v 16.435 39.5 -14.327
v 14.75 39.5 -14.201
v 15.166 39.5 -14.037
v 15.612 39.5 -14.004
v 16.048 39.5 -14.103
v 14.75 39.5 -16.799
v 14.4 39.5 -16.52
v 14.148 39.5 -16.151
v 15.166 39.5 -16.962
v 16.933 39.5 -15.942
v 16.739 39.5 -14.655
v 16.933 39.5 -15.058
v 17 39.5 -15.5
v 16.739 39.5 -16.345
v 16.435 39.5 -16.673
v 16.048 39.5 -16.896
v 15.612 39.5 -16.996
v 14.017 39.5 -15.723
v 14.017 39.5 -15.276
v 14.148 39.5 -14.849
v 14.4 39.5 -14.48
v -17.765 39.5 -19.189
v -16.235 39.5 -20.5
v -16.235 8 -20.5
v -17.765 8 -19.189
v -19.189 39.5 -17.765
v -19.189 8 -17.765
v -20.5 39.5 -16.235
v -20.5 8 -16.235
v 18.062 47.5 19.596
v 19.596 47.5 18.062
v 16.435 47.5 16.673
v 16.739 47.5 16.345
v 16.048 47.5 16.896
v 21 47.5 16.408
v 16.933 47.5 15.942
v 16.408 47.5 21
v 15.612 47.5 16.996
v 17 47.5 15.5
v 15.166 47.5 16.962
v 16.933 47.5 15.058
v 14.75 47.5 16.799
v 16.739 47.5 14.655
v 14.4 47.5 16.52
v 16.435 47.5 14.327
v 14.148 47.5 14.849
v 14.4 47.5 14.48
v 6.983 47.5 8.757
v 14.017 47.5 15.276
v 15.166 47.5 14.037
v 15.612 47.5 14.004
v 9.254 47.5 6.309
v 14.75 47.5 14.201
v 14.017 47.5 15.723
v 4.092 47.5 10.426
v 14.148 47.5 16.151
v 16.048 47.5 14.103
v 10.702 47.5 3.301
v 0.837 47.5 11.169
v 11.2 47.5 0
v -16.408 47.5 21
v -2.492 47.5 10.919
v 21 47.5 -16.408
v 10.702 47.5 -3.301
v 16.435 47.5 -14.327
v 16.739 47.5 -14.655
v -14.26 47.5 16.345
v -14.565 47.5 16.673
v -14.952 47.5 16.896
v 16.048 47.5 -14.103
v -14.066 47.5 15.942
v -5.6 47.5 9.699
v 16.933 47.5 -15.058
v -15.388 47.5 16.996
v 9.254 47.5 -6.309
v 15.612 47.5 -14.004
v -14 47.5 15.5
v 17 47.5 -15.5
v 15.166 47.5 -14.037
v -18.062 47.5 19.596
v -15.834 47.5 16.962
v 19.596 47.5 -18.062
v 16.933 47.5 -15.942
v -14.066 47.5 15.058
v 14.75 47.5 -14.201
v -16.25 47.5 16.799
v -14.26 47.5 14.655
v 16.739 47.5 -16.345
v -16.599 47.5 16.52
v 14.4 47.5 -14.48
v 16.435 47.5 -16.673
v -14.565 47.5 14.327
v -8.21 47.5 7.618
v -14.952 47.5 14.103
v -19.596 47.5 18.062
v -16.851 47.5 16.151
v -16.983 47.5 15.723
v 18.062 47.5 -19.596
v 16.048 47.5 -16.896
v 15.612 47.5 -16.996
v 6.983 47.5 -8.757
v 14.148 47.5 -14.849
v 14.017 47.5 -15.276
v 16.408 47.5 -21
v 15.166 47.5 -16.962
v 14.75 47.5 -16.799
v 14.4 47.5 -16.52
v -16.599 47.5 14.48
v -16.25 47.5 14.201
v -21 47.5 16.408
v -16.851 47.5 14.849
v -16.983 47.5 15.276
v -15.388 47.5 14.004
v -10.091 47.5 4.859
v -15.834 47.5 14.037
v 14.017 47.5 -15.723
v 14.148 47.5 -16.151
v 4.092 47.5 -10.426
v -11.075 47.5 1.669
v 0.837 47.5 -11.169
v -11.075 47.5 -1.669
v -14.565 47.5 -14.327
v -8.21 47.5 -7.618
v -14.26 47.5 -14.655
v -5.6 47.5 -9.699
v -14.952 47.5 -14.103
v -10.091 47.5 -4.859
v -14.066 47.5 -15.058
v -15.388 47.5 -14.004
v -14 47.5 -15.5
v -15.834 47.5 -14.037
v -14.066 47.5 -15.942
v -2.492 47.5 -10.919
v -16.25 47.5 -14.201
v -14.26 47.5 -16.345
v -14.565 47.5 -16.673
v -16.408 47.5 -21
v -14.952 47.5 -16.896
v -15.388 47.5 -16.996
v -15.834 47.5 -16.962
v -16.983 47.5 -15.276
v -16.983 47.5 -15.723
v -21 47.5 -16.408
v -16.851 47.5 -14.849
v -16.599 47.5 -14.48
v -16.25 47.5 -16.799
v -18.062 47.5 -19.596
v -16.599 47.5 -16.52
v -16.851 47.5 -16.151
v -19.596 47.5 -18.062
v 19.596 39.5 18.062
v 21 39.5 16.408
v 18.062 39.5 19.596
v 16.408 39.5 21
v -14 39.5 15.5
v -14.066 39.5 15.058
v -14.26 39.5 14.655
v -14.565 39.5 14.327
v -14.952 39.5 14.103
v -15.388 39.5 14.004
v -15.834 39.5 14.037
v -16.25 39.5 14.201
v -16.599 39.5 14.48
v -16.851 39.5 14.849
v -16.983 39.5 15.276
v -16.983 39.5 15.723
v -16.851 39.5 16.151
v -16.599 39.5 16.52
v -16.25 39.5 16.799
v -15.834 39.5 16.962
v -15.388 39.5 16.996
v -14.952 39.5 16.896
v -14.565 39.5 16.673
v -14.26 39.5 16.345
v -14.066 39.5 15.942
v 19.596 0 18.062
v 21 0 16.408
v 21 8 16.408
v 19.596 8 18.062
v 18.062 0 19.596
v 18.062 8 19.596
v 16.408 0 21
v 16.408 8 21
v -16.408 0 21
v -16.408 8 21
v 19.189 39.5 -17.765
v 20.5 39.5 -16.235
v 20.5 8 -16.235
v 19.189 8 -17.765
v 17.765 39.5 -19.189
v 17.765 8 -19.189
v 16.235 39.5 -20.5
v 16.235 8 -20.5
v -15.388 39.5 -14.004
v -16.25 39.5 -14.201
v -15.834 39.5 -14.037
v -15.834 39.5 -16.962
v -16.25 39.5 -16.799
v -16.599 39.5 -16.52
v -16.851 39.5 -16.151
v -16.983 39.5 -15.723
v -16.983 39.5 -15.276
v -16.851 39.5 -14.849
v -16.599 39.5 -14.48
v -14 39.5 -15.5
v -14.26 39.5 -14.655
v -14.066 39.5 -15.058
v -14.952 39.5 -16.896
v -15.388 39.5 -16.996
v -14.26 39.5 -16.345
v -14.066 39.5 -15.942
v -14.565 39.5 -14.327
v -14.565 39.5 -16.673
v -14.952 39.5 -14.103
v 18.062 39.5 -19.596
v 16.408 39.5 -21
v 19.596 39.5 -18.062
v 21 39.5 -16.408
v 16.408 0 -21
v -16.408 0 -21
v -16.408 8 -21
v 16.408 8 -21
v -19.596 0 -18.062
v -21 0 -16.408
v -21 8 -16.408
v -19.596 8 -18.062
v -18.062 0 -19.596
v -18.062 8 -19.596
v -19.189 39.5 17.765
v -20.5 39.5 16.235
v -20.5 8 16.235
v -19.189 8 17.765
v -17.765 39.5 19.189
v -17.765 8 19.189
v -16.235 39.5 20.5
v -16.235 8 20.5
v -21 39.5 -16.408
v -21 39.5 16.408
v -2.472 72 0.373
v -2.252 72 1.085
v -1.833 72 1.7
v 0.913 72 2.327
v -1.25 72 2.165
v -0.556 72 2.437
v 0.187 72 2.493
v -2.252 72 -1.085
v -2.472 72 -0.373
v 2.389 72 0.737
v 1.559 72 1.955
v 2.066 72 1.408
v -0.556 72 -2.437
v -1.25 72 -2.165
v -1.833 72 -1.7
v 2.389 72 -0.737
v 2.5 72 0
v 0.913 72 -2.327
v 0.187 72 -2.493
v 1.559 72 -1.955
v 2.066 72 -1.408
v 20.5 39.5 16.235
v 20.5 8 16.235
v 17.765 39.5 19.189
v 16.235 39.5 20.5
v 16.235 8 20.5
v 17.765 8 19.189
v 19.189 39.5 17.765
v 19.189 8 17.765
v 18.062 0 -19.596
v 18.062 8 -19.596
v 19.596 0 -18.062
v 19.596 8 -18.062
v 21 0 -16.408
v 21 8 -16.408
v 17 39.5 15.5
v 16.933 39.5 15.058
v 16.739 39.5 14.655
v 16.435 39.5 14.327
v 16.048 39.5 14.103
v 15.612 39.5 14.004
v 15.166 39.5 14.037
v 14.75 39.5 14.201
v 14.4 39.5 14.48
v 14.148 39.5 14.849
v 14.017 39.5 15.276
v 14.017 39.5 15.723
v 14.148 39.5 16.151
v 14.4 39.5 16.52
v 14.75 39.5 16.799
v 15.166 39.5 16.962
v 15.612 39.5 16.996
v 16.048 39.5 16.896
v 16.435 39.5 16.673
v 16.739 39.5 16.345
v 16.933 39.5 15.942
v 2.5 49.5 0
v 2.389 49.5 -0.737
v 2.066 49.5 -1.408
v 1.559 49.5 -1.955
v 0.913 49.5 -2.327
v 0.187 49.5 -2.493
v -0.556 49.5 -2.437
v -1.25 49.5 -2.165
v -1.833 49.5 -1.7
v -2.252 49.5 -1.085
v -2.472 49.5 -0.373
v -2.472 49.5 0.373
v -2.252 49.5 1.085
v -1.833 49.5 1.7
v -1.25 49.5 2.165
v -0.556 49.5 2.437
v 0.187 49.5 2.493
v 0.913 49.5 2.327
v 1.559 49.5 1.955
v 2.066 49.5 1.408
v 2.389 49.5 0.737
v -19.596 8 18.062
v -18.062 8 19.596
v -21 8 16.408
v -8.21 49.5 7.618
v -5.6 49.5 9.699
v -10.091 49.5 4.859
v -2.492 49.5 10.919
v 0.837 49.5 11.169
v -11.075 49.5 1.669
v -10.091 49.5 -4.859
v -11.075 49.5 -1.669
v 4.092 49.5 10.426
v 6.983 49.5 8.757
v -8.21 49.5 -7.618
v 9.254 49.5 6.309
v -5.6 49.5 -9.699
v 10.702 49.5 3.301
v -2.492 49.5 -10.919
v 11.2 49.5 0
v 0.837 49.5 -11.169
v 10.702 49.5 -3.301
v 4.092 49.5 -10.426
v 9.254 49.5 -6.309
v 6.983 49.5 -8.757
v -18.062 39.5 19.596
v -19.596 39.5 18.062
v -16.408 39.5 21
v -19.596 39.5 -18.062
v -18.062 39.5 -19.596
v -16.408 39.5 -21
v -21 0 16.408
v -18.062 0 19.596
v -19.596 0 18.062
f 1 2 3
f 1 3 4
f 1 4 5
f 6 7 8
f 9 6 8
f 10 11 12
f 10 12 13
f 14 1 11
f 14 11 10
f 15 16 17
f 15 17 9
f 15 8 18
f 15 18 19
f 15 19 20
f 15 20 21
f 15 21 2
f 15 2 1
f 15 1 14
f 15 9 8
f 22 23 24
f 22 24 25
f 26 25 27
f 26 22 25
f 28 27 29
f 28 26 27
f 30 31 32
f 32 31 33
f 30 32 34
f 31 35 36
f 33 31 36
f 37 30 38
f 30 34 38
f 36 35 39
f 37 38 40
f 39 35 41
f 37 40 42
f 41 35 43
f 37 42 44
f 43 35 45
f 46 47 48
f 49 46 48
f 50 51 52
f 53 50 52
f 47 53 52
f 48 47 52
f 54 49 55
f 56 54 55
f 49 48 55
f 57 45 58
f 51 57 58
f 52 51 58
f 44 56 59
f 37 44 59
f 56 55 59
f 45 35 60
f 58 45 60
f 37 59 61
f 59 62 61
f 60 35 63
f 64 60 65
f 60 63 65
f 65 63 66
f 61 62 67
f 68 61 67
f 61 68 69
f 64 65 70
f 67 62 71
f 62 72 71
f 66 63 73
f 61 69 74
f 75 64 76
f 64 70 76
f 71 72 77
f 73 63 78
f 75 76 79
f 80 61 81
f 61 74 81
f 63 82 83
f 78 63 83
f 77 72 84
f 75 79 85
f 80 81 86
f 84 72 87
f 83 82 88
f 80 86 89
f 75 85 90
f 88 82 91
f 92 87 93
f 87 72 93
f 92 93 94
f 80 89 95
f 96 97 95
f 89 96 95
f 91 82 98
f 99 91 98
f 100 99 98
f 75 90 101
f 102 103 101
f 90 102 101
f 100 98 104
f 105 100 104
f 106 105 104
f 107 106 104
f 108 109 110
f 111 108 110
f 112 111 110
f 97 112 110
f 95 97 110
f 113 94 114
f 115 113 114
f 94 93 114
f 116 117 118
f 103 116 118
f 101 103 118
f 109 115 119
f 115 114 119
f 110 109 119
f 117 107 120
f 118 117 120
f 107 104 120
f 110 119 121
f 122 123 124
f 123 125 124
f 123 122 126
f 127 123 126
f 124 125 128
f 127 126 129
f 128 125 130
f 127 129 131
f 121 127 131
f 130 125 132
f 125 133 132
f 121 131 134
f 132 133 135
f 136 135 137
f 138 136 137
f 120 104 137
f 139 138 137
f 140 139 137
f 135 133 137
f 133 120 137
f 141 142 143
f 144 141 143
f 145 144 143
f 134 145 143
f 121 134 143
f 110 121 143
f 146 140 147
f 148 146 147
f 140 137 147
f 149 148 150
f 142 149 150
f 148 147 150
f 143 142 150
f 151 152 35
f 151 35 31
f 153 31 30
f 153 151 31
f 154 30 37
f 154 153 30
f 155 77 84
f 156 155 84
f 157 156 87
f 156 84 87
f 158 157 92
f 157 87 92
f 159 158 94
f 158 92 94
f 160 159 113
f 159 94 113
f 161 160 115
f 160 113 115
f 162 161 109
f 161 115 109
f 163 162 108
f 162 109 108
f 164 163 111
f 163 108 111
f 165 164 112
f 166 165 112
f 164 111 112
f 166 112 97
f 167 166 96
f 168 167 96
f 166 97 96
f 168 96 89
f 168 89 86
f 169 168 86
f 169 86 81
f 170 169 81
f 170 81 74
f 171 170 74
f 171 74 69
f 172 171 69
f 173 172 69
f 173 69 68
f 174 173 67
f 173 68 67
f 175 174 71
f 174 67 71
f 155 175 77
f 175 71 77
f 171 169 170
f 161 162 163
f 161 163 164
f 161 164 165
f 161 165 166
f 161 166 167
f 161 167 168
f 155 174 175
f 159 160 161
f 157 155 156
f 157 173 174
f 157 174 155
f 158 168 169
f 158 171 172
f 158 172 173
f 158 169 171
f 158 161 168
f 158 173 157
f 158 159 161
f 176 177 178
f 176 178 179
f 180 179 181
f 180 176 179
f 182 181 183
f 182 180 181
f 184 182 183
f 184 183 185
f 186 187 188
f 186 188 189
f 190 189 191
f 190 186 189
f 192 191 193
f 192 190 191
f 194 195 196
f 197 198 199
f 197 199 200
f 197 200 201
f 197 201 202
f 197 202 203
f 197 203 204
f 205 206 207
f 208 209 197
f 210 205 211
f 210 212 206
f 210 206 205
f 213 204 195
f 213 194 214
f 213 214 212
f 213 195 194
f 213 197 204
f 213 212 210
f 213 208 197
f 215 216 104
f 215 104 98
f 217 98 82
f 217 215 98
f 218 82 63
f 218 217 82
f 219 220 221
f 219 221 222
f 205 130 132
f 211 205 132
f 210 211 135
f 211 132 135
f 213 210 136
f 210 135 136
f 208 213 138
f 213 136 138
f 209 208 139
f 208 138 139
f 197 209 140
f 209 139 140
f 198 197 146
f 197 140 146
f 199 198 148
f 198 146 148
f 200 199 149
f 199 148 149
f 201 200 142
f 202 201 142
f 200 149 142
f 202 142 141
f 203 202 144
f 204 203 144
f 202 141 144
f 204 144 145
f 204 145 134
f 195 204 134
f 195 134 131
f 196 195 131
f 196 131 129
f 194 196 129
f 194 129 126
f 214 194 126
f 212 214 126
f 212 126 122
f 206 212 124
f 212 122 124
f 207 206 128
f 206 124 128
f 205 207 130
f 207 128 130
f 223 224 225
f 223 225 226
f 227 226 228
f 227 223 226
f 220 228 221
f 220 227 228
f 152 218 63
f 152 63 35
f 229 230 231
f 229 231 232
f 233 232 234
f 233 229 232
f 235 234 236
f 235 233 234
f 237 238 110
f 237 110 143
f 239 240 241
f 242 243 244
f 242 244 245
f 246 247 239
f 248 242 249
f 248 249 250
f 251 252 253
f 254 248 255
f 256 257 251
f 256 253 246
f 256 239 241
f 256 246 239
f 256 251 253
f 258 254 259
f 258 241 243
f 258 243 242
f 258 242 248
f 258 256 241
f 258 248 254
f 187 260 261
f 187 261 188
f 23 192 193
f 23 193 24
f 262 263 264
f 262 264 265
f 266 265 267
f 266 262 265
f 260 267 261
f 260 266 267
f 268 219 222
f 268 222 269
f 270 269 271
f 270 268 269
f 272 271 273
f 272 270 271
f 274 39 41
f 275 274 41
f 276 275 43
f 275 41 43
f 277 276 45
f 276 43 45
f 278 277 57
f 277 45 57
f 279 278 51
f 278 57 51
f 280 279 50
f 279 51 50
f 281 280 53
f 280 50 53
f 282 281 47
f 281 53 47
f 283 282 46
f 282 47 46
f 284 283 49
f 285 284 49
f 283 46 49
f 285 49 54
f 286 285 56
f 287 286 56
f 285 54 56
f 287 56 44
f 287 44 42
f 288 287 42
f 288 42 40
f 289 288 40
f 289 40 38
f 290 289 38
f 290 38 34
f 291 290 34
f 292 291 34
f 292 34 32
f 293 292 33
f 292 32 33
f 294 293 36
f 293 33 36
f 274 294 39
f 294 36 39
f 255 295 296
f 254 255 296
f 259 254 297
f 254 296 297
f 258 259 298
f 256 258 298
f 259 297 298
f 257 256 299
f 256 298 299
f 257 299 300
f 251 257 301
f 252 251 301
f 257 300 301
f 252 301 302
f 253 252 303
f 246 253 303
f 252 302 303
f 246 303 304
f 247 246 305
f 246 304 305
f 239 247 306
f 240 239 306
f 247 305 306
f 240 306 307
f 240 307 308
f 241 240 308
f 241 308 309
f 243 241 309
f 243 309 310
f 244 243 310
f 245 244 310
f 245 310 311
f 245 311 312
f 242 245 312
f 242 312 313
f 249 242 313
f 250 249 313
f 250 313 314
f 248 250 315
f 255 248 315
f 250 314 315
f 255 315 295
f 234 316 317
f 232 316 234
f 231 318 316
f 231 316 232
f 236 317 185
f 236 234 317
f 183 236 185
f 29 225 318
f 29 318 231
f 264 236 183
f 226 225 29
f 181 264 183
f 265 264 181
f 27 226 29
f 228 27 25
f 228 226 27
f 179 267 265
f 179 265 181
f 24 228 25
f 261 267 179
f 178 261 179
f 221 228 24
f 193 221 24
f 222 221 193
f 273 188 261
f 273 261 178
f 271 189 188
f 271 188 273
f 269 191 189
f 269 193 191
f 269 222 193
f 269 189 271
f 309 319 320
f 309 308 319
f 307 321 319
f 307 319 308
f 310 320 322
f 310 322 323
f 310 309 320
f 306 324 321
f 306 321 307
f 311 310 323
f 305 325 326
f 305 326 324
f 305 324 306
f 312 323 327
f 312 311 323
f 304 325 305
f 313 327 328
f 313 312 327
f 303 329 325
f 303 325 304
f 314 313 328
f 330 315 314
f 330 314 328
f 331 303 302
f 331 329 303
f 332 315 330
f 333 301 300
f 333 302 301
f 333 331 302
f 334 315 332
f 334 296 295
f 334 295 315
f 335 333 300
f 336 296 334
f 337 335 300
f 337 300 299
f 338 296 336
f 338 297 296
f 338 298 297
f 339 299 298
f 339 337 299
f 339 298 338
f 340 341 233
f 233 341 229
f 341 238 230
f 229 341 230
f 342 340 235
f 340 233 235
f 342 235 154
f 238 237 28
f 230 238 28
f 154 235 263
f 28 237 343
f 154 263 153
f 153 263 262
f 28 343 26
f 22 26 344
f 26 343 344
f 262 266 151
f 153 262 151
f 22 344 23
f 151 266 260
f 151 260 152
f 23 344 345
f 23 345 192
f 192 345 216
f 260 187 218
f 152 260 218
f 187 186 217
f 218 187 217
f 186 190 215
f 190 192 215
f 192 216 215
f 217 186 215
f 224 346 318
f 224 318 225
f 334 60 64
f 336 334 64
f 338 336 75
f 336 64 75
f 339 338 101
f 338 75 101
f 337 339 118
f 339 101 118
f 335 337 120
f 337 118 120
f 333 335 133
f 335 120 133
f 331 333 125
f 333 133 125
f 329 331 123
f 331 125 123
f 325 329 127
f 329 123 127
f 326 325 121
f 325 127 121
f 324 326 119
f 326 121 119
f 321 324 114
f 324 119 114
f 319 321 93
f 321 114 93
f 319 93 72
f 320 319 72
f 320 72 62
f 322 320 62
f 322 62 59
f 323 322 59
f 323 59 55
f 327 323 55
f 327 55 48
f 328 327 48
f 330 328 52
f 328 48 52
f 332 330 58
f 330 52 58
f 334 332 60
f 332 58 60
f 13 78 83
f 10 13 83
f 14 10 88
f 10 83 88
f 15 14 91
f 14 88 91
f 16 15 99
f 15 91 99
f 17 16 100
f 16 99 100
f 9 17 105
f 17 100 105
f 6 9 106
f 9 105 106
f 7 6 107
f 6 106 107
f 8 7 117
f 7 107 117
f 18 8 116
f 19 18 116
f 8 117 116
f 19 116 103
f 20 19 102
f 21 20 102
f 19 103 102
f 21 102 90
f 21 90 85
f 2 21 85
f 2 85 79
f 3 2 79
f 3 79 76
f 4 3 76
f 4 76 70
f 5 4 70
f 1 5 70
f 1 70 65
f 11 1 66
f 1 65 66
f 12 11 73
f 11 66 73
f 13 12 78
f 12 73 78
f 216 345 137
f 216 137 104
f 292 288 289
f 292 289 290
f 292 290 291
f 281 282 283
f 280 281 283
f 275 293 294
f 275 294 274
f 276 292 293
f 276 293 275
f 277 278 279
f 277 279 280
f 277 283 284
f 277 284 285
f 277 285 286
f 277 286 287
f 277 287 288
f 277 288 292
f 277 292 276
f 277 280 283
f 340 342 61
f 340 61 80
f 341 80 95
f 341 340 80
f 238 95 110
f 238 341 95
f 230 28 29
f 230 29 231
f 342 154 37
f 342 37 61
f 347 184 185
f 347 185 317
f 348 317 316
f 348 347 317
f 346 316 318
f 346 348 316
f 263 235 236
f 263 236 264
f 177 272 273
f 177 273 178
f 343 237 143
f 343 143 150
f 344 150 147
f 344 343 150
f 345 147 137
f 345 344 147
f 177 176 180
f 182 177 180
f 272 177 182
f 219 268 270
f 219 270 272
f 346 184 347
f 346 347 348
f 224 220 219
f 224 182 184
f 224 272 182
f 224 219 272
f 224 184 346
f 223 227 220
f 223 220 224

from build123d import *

# Parameters (mm, degrees)
BOSS_EXTRUDE1_DEPTH = 47.5
SKETCH2_R           = 1.5
CUT_EXTRUDE1_DEPTH  = 8
SKETCH3_R           = 11.2
BOSS_EXTRUDE2_DEPTH = 2
SKETCH4_R           = 2.5
BOSS_EXTRUDE3_DEPTH = 22.5
CUT_EXTRUDE2_START  = -8
SKETCH5_OUTSIDE_W   = 62.668
SKETCH5_OUTSIDE_H   = 62.668
CUT_EXTRUDE2_DEPTH  = 31.5


with BuildPart() as part:
    # Sketch1 → Boss-Extrude1 (new body)
    with BuildSketch(Plane(origin=(0, 0, 0), x_dir=(1, 0, 0), z_dir=(0, 1, 0))):
        with BuildLine():
            Line((-16.408001097, 21), (16.408001097, 21))
            ThreePointArc((16.408001097, 21), (18.844395719, 18.844395719), (21, 16.408001097))
            Line((21, 16.408001097), (21, -16.408001097))
            ThreePointArc((21, -16.408001097), (18.844395719, -18.844395719), (16.408001097, -21))
            Line((16.408001097, -21), (-16.408001097, -21))
            ThreePointArc((-16.408001097, -21), (-18.844395719, -18.844395719), (-21, -16.408001097))
            Line((-21, -16.408001097), (-21, 16.408001097))
            ThreePointArc((-21, 16.408001097), (-18.844395719, 18.844395719), (-16.408001097, 21))
        make_face()
    extrude(amount=BOSS_EXTRUDE1_DEPTH)

    # Sketch2 → Cut-Extrude1 (cut)
    with BuildSketch(Plane(origin=(0, 47.5, 0), x_dir=(1, 0, 0), z_dir=(0, 1, 0))):
        with Locations((-15.499780644, 15.499780644)):
            Circle(SKETCH2_R)
        with Locations((-15.499780644, -15.499780644)):
            Circle(SKETCH2_R)
        with Locations((15.499780644, -15.499780644)):
            Circle(SKETCH2_R)
        with Locations((15.499780644, 15.499780644)):
            Circle(SKETCH2_R)
    extrude(amount=-CUT_EXTRUDE1_DEPTH, mode=Mode.SUBTRACT)

    # Sketch3 → Boss-Extrude2 (add)
    with BuildSketch(Plane(origin=(0, 47.5, 0), x_dir=(1, 0, 0), z_dir=(0, 1, 0))):
        Circle(SKETCH3_R)
    extrude(amount=BOSS_EXTRUDE2_DEPTH)

    # Sketch4 → Boss-Extrude3 (add)
    with BuildSketch(Plane(origin=(0, 49.5, 0), x_dir=(1, 0, 0), z_dir=(0, 1, 0))):
        Circle(SKETCH4_R)
    extrude(amount=BOSS_EXTRUDE3_DEPTH)

    # Sketch5 outside → Cut-Extrude2 (cut)
    with BuildSketch(Plane(origin=(0, 47.5, 0), x_dir=(1, 0, 0), z_dir=(0, 1, 0)).offset(CUT_EXTRUDE2_START)):
        Rectangle(SKETCH5_OUTSIDE_W, SKETCH5_OUTSIDE_H)
        with BuildLine():
            Line((-20.5, 16.234916076), (-20.5, -16.234916076))
            ThreePointArc((-20.5, -16.234916076), (-18.490842328, -18.490842328), (-16.234916076, -20.5))
            Line((-16.234916076, -20.5), (16.234916076, -20.5))
            ThreePointArc((16.234916076, -20.5), (18.490842328, -18.490842328), (20.5, -16.234916076))
            Line((20.5, -16.234916076), (20.5, 16.234916076))
            ThreePointArc((20.5, 16.234916076), (18.490842328, 18.490842328), (16.234916076, 20.5))
            Line((16.234916076, 20.5), (-16.234916076, 20.5))
            ThreePointArc((-16.234916076, 20.5), (-18.490842328, 18.490842328), (-20.5, 16.234916076))
        make_face(mode=Mode.SUBTRACT)
    extrude(amount=-CUT_EXTRUDE2_DEPTH, mode=Mode.SUBTRACT)


solid = part.part
